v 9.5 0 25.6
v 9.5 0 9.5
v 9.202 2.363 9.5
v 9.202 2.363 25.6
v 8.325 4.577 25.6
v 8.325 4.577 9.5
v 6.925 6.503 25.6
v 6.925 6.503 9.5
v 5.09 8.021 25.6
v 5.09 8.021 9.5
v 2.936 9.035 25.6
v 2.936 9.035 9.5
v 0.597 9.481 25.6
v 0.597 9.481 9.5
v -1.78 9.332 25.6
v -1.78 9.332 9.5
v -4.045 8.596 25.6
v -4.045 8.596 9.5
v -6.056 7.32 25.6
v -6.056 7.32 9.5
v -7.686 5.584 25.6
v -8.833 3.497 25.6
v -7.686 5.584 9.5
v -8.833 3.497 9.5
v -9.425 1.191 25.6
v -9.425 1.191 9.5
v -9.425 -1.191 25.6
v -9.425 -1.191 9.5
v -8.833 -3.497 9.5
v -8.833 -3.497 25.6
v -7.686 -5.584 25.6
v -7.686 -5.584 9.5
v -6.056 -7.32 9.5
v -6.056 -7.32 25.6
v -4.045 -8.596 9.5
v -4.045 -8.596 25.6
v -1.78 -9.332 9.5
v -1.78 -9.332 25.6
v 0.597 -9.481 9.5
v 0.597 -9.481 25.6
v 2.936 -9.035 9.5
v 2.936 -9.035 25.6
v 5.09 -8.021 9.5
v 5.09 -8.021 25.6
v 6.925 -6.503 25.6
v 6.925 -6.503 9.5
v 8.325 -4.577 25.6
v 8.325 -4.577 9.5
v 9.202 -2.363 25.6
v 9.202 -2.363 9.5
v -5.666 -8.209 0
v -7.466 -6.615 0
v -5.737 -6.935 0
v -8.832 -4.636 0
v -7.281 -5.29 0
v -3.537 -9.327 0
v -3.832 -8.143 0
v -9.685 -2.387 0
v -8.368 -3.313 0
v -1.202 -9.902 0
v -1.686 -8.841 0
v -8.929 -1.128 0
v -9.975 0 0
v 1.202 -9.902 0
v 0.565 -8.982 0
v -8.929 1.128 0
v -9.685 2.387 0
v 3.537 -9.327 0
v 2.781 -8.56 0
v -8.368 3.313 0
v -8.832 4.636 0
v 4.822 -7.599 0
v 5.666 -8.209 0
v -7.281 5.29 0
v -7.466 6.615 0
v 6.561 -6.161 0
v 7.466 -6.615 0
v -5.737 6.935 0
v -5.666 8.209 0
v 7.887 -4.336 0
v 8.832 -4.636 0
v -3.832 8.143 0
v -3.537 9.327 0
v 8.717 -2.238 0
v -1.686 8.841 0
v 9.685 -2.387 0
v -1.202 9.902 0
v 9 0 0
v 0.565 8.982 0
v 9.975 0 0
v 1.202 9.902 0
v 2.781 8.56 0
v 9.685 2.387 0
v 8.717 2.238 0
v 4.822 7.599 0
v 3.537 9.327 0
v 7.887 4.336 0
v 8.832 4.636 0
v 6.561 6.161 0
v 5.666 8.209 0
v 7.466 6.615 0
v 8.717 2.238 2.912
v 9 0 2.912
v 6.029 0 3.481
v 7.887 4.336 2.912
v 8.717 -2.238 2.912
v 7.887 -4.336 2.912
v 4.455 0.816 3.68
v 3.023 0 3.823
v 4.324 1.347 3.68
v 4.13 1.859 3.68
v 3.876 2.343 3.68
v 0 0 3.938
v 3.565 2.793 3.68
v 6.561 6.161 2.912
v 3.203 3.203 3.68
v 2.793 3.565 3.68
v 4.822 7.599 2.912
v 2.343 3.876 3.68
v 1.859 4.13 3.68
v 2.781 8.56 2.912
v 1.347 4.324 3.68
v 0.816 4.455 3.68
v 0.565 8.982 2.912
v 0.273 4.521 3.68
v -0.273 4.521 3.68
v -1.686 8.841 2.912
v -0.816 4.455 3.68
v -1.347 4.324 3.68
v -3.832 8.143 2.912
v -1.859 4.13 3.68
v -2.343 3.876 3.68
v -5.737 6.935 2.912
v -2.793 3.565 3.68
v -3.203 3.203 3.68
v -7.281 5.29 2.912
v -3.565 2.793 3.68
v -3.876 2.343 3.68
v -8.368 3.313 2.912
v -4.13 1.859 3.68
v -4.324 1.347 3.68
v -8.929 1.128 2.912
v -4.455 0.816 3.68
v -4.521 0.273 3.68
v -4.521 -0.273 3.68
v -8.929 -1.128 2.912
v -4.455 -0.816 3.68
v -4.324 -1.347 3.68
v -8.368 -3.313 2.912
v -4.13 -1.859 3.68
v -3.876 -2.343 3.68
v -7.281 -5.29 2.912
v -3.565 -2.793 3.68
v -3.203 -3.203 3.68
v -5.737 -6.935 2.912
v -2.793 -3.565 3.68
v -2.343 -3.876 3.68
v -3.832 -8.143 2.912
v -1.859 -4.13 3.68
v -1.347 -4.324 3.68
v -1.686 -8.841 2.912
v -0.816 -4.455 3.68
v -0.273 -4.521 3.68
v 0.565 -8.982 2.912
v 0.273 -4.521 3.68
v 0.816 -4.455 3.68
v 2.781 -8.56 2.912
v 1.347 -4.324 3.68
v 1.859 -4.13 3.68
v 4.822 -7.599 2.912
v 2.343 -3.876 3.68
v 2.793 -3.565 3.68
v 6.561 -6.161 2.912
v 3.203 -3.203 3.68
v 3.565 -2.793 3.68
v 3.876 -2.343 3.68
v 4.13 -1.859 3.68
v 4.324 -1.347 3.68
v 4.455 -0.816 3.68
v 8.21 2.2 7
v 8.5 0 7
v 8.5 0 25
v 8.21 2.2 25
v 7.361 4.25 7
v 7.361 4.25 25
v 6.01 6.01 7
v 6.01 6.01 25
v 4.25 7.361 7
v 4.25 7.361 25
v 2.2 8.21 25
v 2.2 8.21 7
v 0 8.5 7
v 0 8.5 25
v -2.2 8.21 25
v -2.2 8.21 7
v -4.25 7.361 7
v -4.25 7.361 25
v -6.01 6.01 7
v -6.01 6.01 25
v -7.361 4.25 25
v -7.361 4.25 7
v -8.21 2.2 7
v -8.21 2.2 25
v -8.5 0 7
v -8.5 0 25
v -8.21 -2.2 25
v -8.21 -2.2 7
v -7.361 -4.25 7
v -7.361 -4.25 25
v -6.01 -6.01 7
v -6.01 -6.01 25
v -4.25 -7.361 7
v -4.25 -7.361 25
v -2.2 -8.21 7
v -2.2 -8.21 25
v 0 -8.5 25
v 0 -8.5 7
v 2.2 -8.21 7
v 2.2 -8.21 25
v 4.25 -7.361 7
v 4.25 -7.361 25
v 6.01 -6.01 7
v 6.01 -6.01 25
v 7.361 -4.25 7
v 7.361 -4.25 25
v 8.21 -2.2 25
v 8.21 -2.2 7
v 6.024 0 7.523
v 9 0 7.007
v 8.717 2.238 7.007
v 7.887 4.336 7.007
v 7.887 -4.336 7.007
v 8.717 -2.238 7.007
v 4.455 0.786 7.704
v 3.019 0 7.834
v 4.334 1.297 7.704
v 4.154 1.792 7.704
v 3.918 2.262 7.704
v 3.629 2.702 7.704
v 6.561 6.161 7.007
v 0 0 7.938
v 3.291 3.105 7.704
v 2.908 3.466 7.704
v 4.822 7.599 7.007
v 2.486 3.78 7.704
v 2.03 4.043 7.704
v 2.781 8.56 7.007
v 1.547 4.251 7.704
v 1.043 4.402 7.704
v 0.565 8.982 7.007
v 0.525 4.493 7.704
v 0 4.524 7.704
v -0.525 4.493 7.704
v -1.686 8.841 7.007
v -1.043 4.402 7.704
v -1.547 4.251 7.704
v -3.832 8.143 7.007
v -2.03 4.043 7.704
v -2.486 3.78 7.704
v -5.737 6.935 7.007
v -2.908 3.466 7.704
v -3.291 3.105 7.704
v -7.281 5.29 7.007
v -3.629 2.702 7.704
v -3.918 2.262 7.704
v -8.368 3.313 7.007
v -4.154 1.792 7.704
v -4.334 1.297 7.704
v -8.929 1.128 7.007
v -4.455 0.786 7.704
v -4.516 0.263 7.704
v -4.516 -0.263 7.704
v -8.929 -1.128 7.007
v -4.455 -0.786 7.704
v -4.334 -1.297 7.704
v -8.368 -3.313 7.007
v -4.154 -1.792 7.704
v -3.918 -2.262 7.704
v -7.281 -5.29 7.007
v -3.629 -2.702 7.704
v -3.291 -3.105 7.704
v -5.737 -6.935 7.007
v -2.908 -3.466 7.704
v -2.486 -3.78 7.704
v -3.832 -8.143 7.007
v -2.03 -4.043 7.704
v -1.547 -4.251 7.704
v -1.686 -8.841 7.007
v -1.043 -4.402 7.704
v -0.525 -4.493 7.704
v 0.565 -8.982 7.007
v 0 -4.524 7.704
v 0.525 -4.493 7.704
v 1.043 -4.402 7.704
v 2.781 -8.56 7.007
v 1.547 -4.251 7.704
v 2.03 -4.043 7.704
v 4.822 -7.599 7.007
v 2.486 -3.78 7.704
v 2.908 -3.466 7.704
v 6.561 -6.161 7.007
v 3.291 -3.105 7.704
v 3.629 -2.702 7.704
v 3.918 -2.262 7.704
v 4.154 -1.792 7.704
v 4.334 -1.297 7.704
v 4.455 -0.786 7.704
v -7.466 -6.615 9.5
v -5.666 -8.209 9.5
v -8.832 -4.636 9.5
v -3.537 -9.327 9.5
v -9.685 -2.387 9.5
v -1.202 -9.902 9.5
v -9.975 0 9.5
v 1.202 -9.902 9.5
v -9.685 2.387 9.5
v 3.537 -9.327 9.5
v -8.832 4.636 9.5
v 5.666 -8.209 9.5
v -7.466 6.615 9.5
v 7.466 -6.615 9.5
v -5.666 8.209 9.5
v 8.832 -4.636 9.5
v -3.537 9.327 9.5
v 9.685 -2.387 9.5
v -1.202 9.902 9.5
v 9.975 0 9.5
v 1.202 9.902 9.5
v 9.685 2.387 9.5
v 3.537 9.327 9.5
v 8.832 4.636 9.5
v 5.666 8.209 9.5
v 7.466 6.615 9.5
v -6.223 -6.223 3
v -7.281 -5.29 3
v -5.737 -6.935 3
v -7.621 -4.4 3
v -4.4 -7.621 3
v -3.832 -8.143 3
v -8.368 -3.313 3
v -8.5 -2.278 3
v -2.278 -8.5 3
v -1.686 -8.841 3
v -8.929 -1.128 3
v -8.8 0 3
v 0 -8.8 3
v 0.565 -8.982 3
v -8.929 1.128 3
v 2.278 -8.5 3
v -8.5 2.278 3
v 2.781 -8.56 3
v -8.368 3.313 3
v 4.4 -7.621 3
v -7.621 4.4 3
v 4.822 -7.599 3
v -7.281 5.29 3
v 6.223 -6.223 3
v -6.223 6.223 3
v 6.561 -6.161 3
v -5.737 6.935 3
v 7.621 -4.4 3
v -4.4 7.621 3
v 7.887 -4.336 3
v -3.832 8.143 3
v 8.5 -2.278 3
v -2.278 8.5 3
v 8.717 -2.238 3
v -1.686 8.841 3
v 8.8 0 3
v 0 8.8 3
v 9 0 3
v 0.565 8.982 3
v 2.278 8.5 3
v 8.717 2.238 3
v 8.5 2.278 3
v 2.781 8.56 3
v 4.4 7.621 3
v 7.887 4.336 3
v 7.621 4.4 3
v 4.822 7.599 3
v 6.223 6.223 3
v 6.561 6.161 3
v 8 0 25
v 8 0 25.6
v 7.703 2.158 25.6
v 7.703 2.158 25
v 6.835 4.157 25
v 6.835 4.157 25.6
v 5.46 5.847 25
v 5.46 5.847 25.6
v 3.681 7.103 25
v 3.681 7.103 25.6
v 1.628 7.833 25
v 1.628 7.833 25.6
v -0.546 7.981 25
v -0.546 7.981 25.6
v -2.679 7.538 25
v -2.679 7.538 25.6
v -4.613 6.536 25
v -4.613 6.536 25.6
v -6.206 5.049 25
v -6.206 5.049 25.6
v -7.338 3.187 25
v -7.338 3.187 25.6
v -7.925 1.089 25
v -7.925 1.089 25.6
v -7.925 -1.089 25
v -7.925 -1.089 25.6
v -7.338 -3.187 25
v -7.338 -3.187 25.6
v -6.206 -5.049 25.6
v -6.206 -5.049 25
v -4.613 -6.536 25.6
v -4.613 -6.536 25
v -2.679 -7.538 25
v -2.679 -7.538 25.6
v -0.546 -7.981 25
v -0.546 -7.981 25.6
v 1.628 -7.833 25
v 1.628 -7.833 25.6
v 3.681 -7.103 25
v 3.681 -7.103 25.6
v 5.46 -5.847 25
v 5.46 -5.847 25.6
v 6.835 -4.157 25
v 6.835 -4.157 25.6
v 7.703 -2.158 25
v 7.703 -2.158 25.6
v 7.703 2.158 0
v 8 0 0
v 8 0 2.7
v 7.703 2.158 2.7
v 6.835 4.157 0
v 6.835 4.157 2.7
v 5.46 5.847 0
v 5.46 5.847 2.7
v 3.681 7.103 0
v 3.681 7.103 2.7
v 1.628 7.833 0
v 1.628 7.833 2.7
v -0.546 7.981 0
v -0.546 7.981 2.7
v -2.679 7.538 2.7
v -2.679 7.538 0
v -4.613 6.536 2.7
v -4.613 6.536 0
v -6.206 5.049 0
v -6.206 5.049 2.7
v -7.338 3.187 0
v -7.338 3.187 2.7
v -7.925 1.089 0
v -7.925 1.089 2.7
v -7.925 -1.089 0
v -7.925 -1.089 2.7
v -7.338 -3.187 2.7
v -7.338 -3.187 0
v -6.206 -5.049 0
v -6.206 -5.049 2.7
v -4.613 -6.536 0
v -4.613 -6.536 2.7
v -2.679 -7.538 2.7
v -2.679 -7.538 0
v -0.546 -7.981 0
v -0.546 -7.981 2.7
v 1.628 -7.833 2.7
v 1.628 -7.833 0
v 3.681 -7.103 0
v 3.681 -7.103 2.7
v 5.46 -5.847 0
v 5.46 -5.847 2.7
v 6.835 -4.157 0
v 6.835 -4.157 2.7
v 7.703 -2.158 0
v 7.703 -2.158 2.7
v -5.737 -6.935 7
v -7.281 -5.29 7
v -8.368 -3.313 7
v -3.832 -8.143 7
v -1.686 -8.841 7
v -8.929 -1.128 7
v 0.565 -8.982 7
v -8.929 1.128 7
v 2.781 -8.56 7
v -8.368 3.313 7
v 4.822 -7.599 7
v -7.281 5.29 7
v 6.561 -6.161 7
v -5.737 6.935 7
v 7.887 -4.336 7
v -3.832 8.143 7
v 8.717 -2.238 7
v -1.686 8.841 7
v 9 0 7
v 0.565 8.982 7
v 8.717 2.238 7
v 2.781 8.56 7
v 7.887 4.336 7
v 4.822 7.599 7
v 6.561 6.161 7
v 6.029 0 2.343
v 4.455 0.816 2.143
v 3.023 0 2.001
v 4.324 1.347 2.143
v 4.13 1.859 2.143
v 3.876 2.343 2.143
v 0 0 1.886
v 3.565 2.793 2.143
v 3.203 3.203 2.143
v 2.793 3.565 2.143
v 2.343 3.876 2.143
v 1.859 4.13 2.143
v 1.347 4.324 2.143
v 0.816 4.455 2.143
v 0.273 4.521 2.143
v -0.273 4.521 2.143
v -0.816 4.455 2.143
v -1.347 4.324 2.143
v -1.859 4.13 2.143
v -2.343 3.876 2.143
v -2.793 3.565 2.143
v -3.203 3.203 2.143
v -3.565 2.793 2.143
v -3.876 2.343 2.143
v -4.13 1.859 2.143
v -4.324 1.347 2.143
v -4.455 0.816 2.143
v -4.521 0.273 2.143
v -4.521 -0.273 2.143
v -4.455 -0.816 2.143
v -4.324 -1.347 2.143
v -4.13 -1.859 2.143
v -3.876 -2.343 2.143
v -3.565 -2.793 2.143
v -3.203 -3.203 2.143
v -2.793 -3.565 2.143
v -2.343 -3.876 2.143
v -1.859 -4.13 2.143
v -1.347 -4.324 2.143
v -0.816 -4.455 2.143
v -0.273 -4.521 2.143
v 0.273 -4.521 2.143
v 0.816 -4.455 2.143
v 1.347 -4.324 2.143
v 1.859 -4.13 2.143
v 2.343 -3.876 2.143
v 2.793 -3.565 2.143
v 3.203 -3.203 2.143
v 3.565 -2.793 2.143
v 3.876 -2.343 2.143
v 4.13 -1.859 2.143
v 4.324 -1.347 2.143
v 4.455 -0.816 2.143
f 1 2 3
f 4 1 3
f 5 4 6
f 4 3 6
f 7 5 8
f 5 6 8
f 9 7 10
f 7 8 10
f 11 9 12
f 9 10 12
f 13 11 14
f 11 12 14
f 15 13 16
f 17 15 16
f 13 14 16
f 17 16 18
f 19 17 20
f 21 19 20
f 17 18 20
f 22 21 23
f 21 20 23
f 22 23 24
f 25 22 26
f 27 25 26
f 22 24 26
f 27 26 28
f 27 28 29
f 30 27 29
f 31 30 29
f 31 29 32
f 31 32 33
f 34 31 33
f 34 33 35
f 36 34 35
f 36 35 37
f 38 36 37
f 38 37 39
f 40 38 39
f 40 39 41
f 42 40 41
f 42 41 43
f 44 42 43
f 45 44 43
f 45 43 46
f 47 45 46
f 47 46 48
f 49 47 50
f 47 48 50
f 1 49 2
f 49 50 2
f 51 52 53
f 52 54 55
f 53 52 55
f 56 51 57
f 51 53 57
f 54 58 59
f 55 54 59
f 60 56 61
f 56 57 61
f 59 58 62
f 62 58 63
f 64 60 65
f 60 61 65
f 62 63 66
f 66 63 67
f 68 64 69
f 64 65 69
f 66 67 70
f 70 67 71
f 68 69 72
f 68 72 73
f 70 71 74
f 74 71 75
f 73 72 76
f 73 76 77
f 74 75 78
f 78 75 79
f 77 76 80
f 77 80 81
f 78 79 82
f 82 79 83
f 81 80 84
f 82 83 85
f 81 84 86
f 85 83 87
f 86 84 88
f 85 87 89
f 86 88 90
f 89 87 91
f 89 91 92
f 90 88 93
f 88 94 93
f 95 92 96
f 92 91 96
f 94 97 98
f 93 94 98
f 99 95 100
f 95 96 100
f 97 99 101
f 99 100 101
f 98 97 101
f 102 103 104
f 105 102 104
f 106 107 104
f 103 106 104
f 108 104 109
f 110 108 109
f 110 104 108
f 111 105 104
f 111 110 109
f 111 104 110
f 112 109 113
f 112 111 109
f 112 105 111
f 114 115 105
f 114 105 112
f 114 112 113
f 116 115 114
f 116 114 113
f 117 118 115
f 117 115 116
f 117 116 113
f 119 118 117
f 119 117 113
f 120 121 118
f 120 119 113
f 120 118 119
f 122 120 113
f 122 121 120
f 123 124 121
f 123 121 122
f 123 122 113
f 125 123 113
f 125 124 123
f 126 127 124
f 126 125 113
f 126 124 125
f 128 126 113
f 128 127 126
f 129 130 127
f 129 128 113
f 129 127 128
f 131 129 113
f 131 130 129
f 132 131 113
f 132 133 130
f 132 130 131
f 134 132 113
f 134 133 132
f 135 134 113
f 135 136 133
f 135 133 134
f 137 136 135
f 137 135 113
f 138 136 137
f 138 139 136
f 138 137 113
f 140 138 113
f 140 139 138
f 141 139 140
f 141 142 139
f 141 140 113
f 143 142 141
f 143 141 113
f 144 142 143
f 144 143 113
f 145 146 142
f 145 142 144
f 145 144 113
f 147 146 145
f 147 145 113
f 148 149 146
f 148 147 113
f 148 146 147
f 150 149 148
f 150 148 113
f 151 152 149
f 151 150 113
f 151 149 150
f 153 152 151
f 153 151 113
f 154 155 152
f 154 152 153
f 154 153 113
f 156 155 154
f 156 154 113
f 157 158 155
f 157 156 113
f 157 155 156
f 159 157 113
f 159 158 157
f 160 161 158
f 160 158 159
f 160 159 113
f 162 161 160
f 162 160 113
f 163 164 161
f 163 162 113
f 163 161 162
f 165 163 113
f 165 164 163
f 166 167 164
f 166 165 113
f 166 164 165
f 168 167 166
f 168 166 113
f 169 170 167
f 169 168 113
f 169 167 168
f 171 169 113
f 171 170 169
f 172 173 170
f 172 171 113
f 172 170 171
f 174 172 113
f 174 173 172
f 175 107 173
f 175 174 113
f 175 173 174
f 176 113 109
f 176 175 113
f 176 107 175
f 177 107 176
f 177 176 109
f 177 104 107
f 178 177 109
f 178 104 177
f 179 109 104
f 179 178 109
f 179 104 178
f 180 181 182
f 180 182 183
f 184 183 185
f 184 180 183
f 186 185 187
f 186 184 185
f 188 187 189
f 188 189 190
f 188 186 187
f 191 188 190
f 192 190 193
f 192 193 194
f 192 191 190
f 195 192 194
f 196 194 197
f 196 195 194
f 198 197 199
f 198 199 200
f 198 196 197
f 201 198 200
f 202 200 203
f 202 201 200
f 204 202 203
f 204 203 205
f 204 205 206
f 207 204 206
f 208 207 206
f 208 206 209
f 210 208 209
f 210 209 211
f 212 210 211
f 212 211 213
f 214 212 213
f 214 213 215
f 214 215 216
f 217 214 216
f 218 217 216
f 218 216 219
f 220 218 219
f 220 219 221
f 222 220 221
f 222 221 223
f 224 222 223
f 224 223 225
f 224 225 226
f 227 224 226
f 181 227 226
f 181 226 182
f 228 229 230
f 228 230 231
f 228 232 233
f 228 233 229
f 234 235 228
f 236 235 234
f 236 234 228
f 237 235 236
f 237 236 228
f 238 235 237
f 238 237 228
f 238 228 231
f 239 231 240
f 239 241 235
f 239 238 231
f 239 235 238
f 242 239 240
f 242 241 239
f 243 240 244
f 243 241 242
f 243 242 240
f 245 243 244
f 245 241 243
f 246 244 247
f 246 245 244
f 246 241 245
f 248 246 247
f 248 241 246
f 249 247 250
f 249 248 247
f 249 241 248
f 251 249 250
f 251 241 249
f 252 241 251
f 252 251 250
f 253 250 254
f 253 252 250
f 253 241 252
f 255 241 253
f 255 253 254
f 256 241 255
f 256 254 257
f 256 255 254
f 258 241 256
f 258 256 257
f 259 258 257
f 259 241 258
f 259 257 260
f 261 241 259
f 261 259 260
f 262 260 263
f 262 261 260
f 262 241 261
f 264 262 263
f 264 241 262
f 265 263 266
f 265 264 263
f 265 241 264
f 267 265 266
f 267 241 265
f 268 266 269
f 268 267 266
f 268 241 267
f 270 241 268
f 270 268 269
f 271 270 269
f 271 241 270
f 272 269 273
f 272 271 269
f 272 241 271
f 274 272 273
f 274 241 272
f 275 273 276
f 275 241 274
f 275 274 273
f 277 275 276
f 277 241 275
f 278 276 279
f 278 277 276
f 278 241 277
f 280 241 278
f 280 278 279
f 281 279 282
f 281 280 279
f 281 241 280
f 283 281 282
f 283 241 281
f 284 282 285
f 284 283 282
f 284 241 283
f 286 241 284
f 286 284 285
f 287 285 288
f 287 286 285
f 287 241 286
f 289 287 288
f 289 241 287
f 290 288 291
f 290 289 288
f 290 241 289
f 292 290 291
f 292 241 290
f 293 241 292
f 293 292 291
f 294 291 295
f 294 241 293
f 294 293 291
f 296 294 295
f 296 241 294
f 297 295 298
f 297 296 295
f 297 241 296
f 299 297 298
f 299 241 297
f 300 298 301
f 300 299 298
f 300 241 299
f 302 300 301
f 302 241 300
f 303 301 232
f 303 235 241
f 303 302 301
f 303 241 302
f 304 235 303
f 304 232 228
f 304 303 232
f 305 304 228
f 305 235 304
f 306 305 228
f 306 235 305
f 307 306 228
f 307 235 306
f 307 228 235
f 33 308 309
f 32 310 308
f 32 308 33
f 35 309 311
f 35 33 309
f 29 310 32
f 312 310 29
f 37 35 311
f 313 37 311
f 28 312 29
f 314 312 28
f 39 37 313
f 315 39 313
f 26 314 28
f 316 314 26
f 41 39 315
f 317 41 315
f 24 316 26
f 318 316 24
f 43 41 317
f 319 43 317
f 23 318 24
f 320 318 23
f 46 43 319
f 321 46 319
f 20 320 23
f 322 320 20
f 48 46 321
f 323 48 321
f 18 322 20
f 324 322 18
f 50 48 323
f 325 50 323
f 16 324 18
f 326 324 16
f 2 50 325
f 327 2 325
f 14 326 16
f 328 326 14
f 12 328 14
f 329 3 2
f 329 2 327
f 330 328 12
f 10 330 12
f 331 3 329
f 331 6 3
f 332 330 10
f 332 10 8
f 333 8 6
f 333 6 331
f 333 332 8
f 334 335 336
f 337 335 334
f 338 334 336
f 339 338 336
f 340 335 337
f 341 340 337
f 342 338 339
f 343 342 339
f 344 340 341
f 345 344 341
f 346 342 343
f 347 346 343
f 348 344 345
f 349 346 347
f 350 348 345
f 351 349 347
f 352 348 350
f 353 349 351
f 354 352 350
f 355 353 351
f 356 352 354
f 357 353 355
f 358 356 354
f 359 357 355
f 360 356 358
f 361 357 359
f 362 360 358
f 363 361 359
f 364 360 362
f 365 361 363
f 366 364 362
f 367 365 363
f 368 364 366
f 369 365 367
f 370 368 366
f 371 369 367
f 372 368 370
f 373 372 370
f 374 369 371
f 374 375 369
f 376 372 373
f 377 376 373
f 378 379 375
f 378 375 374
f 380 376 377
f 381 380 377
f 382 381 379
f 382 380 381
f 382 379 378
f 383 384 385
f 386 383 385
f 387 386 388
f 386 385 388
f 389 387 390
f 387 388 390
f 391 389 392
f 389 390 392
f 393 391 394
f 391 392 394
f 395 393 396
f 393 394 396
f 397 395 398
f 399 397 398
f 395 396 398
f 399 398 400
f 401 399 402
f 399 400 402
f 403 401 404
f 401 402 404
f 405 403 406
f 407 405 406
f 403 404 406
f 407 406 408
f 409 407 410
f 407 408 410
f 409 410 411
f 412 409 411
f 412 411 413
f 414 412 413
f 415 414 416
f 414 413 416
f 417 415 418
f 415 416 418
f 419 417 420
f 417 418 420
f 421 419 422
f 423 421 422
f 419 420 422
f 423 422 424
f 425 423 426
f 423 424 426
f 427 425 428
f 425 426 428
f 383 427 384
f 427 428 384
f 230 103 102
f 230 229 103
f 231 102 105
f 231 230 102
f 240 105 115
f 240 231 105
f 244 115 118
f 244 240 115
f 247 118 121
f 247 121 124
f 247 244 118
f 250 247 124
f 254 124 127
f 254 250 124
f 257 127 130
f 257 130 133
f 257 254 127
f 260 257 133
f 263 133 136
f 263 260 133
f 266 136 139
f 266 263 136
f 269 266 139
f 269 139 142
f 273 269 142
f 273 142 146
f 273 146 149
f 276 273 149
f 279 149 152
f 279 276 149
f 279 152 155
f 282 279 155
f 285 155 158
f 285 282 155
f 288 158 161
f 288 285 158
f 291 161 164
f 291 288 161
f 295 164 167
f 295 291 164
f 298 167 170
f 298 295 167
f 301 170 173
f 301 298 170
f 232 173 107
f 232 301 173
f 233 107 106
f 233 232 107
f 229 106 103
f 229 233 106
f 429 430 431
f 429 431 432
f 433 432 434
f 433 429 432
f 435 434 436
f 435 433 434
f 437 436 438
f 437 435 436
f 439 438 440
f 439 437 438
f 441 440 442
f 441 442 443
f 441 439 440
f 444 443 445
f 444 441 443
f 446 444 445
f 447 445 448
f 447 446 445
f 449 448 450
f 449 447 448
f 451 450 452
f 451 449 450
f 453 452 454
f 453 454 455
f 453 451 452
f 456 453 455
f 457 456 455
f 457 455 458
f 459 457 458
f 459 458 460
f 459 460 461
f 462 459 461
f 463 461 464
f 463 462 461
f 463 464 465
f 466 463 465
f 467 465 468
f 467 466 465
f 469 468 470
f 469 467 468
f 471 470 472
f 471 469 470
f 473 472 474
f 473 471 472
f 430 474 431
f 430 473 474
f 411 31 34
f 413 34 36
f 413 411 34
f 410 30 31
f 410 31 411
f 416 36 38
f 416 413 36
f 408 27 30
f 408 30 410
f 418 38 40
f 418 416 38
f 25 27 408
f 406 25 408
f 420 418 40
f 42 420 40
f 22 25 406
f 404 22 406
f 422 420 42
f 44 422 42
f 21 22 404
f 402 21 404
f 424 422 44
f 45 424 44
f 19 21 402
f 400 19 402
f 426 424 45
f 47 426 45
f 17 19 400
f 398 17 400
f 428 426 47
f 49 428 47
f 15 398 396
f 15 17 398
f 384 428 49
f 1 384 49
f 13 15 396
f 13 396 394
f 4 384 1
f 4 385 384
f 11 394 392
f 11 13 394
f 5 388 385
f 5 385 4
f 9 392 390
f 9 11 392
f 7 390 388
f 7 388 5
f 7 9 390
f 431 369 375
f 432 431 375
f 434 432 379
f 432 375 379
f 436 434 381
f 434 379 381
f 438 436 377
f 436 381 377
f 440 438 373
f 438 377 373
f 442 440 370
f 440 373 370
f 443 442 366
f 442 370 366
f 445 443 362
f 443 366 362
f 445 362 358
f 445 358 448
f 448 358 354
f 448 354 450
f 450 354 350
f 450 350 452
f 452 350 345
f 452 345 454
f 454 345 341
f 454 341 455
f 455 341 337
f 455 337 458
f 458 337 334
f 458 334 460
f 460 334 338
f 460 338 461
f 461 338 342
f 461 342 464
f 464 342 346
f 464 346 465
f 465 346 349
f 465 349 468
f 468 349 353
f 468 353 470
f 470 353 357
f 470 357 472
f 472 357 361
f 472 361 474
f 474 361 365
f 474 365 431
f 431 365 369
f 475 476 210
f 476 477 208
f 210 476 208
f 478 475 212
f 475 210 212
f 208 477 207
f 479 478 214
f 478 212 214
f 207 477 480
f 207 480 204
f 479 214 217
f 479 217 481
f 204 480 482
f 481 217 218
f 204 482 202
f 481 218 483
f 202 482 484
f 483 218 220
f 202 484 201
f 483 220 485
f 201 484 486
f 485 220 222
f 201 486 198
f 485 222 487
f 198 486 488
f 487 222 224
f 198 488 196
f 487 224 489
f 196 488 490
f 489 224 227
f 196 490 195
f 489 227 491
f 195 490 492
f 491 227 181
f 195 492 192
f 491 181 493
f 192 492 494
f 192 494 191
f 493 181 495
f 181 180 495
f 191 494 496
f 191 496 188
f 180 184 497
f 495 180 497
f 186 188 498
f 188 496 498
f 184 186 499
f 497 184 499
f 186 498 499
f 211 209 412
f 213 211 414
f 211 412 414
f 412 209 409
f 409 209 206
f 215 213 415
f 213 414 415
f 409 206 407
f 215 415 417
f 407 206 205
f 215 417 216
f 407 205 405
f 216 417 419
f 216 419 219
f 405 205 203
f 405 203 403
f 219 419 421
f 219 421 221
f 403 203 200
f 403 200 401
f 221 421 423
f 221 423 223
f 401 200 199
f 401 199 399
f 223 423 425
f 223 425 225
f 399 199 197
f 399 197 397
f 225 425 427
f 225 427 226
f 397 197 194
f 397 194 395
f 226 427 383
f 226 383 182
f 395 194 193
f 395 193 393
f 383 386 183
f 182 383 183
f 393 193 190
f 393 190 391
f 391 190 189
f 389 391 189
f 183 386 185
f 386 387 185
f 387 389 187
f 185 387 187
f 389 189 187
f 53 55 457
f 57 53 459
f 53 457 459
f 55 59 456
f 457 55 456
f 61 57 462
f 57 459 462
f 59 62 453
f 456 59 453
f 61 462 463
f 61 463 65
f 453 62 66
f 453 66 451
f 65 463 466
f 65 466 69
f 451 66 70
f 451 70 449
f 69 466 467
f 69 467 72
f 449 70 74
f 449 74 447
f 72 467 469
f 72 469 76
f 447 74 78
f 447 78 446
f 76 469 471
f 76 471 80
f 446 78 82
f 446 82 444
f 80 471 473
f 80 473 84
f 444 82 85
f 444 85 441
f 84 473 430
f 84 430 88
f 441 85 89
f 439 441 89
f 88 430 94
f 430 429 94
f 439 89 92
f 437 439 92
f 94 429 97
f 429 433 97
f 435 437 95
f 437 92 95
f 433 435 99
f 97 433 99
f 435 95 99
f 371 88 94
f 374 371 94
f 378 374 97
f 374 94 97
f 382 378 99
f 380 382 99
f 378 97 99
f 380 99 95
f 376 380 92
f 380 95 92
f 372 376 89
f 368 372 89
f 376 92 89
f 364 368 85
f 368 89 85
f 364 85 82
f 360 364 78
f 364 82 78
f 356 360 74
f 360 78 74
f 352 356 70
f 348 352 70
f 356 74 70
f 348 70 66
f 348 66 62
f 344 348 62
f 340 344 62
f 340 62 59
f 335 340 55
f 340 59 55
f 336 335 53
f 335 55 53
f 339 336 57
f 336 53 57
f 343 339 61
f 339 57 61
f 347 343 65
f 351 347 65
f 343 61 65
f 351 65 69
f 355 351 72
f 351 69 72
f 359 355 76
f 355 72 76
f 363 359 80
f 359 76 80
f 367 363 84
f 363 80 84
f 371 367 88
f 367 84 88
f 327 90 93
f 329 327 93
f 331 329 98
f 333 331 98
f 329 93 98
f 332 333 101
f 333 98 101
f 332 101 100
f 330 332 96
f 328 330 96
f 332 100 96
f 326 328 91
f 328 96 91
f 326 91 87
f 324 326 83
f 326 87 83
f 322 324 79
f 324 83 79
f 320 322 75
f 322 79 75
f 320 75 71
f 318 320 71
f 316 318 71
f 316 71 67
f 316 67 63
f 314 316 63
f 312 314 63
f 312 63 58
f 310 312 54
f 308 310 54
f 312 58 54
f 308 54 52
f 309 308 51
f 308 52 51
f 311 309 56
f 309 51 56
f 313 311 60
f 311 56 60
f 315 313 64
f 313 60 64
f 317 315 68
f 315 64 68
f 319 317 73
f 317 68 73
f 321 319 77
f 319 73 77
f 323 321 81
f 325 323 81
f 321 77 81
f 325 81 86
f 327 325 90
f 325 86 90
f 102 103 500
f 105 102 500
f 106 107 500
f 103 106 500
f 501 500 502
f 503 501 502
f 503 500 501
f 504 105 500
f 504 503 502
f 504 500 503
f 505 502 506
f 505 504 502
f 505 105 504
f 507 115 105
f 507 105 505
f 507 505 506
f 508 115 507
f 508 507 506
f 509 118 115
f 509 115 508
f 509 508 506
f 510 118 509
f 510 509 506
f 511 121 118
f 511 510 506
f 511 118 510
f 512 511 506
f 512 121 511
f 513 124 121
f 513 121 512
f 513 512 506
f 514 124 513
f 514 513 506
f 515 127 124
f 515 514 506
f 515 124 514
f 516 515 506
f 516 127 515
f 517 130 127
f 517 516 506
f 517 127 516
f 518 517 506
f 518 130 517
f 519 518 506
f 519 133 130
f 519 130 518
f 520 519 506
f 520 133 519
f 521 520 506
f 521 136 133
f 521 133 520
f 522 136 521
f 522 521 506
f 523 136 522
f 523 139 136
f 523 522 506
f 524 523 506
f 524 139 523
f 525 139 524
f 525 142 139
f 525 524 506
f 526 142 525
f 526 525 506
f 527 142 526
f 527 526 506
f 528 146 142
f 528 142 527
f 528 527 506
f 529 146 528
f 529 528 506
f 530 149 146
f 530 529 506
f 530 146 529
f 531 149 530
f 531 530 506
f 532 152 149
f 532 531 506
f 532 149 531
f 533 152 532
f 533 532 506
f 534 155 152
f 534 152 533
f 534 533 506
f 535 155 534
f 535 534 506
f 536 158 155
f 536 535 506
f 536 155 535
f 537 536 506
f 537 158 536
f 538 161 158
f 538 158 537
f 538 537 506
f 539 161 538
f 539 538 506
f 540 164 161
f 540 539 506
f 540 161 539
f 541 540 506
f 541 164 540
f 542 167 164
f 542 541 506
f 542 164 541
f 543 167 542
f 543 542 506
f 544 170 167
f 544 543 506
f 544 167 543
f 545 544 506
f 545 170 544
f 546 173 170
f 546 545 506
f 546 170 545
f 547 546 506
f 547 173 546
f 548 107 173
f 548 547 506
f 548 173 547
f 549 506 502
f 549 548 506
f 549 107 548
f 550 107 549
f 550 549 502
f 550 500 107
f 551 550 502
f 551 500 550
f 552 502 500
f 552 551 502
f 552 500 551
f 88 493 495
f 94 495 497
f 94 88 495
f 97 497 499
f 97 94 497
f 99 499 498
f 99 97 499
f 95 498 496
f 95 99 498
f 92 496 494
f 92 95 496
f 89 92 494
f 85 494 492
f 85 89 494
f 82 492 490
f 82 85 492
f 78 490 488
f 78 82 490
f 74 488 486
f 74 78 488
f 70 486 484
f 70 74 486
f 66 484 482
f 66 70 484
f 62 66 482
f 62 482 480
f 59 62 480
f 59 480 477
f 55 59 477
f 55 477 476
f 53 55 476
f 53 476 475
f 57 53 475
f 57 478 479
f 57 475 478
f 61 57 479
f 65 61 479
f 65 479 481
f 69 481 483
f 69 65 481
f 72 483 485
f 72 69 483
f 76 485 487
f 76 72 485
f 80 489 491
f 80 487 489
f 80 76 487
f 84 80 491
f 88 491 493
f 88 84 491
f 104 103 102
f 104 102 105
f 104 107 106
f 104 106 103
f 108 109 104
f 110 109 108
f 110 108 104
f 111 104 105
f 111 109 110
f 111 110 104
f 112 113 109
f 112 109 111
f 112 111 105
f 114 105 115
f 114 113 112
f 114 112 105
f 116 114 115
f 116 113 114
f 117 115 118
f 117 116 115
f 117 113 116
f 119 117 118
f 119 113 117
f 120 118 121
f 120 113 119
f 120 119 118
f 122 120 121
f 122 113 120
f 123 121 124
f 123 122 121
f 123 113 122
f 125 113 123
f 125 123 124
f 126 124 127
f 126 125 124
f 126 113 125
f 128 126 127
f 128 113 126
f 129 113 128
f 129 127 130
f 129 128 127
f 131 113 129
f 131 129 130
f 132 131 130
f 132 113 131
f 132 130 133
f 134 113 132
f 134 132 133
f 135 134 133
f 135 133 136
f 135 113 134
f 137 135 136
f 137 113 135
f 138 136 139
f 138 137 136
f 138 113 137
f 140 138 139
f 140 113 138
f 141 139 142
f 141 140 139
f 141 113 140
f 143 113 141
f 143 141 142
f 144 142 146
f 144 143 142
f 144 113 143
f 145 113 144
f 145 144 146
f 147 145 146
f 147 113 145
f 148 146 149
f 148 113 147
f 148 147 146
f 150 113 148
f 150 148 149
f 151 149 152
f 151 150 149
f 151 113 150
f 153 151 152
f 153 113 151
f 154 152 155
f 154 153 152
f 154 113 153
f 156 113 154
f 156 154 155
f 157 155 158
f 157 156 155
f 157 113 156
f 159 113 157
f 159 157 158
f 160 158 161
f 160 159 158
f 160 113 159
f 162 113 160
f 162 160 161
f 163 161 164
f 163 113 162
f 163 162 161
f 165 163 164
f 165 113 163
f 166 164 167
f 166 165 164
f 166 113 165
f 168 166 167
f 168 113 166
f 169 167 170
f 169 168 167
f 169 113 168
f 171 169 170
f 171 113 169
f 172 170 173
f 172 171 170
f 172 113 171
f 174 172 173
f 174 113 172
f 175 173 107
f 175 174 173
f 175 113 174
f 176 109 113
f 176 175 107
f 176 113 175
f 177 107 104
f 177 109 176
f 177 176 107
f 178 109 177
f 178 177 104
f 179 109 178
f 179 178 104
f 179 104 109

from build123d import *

# Parameters (mm, degrees)
F0_R     = 9.975
F0_R_2   = 9.5
F0_R_3   = 9
F1_DEPTH = 9.5
F3_R     = 9.5
F3_R_2   = 8.5
F4_DEPTH = 18.6
F6_R     = 8.5
F6_R_2   = 8
F7_DEPTH = 0.6
F0_R_4   = 8.5
F0_R_5   = 8.4
F0_R_6   = 8
F8_DEPTH = 3
F9_SIZE2 = 0.8
F9_SIZE  = 0.3


with BuildPart() as f1:
    # F0 (on Top) → F1 (new body)
    with BuildSketch(Plane.XY):
        Circle(F0_R)
        Circle(F0_R_2, mode=Mode.SUBTRACT)
        Circle(F0_R_2)
        Circle(F0_R_3, mode=Mode.SUBTRACT)
    extrude(amount=F1_DEPTH)

    # F3 (on offset) → F4 (join)
    with BuildSketch(Plane.XY.offset(7)):
        Circle(F3_R)
        Circle(F3_R_2, mode=Mode.SUBTRACT)
    extrude(amount=F4_DEPTH)

    # F6 (on offset) → F7 (join)
    with BuildSketch(Plane.XY.offset(25.6)):
        Circle(F6_R)
        Circle(F6_R_2, mode=Mode.SUBTRACT)
    extrude(amount=-F7_DEPTH)


with BuildPart() as f8:
    # F0 (on Top) → F8 (new body)
    with BuildSketch(Plane.XY):
        Circle(F0_R_3)
        Circle(F0_R_4, mode=Mode.SUBTRACT)
        Circle(F0_R_4)
        Circle(F0_R_5, mode=Mode.SUBTRACT)
        Circle(F0_R_5)
        Circle(F0_R_6, mode=Mode.SUBTRACT)
    extrude(amount=F8_DEPTH)

    # F9
    f9_edges = [f8.edges().sort_by_distance(p)[0] for p in [
        (-8, 0, 3),
    ]]
    f9_side = f8.faces().sort_by_distance((-8, 0, 1.5))[0]
    chamfer(f9_edges, length=F9_SIZE, length2=F9_SIZE2, reference=f9_side)


with BuildPart() as f11:
    # F10 (on Front) → F11 (revolve)
    with BuildSketch(Plane.XZ):
        with BuildLine():
            ThreePointArc((0, 3.937538316), (4.5291267595, 3.6802987989), (9, 2.9118888558))
            Line((9, 2.9118888558), (9, 7.0072492507))
            ThreePointArc((9, 7.0072492507), (4.523976065, 7.7043481217), (0, 7.937538316))
            Line((0, 7.937538316), (0, 3.937538316))
        make_face()
    revolve(axis=Axis((0, 0, 9.7422385588), (0, 0, 1)))


with BuildPart() as f12:
    # F10 (on Front) → F12 (revolve)
    with BuildSketch(Plane.XZ):
        with BuildLine():
            ThreePointArc((0, 1.8862393956), (4.5291267595, 2.1434789128), (9, 2.9118888558))
            ThreePointArc((9, 2.9118888558), (4.5291267595, 3.6802987989), (0, 3.937538316))
            Line((0, 3.937538316), (0, 1.8862393956))
        make_face()
    revolve(axis=Axis((0, 0, 9.7422385588), (0, 0, 1)))


solid = Compound([f1.part, f8.part, f11.part, f12.part])
